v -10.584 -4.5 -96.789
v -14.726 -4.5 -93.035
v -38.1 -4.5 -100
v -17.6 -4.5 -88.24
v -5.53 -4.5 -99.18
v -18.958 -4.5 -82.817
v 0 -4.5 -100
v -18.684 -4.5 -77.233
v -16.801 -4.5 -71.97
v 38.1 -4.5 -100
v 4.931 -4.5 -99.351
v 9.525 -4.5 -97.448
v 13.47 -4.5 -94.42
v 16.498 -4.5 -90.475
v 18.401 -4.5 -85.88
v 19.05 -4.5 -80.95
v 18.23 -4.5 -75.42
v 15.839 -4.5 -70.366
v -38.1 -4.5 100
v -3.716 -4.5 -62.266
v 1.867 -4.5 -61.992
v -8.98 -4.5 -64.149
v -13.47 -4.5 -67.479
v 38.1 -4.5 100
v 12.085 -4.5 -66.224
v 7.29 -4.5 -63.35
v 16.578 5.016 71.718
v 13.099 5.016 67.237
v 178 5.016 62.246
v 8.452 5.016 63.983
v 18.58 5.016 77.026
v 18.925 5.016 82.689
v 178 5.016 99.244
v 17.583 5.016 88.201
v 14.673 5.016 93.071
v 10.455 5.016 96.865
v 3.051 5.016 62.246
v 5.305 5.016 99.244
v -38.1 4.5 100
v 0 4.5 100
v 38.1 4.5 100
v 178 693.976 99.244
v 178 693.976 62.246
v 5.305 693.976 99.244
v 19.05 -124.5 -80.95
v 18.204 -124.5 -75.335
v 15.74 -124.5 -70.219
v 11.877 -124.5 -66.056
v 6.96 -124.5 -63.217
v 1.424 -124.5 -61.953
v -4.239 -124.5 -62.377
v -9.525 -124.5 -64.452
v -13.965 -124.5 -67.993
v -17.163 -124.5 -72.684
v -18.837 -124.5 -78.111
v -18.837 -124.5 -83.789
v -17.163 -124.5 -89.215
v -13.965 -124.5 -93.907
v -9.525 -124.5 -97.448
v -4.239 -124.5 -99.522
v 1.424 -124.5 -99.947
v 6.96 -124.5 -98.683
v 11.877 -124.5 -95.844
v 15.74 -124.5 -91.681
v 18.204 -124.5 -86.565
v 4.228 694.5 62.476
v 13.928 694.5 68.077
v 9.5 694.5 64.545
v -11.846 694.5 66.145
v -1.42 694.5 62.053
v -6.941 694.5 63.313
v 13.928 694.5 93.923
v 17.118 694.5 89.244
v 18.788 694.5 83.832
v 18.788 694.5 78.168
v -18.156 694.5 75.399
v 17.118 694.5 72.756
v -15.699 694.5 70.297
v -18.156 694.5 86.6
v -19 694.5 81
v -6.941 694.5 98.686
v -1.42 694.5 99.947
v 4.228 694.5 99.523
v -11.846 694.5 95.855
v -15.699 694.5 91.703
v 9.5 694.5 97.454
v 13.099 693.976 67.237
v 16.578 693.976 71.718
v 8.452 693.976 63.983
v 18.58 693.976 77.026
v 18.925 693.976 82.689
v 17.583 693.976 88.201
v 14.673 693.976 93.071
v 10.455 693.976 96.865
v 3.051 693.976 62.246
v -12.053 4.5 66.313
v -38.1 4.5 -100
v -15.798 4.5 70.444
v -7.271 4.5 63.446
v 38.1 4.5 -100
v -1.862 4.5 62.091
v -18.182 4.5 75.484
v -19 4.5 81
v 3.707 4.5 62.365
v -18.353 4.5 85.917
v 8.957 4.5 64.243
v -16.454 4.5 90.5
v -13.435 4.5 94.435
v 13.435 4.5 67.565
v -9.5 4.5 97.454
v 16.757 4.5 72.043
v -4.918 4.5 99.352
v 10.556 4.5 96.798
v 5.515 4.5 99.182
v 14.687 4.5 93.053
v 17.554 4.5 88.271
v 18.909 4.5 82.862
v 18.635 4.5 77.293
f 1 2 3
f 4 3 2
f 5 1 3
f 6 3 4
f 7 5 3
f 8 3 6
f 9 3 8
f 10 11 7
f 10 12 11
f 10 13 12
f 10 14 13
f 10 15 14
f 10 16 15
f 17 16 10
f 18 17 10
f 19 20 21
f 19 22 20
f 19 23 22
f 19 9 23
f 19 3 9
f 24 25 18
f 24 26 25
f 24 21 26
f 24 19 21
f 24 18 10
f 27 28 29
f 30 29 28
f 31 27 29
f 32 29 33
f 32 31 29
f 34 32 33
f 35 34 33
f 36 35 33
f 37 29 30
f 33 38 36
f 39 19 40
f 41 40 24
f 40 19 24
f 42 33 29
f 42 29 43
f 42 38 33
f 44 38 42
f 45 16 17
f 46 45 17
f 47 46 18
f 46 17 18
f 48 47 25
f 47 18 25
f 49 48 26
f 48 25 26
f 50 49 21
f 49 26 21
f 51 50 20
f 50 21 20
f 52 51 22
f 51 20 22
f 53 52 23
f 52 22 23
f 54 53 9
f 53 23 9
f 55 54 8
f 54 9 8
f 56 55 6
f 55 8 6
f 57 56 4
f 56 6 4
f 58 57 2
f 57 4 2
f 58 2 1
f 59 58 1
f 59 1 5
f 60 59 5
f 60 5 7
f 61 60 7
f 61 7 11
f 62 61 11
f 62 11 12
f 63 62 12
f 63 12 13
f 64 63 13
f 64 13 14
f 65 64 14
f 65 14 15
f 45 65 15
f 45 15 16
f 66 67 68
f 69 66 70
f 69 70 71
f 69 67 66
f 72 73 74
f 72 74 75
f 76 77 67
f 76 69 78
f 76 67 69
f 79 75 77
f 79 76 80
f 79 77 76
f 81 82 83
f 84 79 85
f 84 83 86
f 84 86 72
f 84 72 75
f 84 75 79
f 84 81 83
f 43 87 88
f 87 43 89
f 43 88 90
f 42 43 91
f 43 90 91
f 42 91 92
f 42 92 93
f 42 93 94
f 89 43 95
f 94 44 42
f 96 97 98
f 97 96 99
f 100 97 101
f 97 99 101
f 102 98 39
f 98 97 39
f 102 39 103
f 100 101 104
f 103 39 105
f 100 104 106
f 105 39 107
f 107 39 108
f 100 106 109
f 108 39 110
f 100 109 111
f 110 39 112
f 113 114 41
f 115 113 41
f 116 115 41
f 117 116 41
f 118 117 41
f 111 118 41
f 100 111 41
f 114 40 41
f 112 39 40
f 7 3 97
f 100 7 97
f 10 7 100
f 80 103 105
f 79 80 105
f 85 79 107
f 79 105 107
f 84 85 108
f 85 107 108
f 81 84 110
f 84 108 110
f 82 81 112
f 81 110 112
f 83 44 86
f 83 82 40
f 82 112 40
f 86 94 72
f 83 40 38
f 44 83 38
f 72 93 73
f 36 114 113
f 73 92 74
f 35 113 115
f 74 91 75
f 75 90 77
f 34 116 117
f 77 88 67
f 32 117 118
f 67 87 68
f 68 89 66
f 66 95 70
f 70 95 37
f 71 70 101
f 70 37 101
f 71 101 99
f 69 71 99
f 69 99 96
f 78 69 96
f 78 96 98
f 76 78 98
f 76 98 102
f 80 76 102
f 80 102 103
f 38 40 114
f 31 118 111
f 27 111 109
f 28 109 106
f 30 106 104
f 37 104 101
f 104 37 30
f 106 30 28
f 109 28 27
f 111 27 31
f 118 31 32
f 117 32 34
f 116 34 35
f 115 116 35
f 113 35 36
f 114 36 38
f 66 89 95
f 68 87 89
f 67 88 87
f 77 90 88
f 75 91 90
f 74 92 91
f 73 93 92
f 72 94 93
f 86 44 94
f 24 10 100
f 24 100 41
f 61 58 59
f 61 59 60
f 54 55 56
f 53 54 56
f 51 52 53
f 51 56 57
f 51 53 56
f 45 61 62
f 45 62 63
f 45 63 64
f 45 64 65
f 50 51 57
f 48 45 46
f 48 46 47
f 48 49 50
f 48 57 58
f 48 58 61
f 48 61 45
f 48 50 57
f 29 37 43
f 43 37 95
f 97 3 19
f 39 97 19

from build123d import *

# Parameters (mm, degrees)
F0_W     = 76.2
F0_H     = 199.9996
F1_DEPTH = 4.499991
F2_R     = 19.05
F3_DEPTH = 120
F4_R     = 19
F5_DEPTH = 690
F6_W     = 688.959937
F6_H     = 36.997854
F7_DEPTH = 178


with BuildPart() as f1:
    # F0 (on Front) → F1 (new body, symmetric)
    with BuildSketch(Plane.XZ):
        Rectangle(F0_W, F0_H)
    extrude(amount=F1_DEPTH, both=True)

    # F2 (on face) → F3 (join)
    with BuildSketch(Plane.XZ.offset(4.499991)):
        with Locations((0, -80.9498)):
            Circle(F2_R)
    extrude(amount=F3_DEPTH)

    # F4 (on face) → F5 (join)
    with BuildSketch(Plane(origin=(0, 4.499991, 0), x_dir=(-1, 0, 0), z_dir=(0, 1, 0))):
        with Locations((0, 80.9998)):
            Circle(F4_R)
    extrude(amount=F5_DEPTH)

    # F6 (on Right) → F7 (join)
    with BuildSketch(Plane.YZ):
        with Locations((349.496255, 80.745302)):
            Rectangle(F6_W, F6_H)
    extrude(amount=F7_DEPTH)


solid = f1.part
